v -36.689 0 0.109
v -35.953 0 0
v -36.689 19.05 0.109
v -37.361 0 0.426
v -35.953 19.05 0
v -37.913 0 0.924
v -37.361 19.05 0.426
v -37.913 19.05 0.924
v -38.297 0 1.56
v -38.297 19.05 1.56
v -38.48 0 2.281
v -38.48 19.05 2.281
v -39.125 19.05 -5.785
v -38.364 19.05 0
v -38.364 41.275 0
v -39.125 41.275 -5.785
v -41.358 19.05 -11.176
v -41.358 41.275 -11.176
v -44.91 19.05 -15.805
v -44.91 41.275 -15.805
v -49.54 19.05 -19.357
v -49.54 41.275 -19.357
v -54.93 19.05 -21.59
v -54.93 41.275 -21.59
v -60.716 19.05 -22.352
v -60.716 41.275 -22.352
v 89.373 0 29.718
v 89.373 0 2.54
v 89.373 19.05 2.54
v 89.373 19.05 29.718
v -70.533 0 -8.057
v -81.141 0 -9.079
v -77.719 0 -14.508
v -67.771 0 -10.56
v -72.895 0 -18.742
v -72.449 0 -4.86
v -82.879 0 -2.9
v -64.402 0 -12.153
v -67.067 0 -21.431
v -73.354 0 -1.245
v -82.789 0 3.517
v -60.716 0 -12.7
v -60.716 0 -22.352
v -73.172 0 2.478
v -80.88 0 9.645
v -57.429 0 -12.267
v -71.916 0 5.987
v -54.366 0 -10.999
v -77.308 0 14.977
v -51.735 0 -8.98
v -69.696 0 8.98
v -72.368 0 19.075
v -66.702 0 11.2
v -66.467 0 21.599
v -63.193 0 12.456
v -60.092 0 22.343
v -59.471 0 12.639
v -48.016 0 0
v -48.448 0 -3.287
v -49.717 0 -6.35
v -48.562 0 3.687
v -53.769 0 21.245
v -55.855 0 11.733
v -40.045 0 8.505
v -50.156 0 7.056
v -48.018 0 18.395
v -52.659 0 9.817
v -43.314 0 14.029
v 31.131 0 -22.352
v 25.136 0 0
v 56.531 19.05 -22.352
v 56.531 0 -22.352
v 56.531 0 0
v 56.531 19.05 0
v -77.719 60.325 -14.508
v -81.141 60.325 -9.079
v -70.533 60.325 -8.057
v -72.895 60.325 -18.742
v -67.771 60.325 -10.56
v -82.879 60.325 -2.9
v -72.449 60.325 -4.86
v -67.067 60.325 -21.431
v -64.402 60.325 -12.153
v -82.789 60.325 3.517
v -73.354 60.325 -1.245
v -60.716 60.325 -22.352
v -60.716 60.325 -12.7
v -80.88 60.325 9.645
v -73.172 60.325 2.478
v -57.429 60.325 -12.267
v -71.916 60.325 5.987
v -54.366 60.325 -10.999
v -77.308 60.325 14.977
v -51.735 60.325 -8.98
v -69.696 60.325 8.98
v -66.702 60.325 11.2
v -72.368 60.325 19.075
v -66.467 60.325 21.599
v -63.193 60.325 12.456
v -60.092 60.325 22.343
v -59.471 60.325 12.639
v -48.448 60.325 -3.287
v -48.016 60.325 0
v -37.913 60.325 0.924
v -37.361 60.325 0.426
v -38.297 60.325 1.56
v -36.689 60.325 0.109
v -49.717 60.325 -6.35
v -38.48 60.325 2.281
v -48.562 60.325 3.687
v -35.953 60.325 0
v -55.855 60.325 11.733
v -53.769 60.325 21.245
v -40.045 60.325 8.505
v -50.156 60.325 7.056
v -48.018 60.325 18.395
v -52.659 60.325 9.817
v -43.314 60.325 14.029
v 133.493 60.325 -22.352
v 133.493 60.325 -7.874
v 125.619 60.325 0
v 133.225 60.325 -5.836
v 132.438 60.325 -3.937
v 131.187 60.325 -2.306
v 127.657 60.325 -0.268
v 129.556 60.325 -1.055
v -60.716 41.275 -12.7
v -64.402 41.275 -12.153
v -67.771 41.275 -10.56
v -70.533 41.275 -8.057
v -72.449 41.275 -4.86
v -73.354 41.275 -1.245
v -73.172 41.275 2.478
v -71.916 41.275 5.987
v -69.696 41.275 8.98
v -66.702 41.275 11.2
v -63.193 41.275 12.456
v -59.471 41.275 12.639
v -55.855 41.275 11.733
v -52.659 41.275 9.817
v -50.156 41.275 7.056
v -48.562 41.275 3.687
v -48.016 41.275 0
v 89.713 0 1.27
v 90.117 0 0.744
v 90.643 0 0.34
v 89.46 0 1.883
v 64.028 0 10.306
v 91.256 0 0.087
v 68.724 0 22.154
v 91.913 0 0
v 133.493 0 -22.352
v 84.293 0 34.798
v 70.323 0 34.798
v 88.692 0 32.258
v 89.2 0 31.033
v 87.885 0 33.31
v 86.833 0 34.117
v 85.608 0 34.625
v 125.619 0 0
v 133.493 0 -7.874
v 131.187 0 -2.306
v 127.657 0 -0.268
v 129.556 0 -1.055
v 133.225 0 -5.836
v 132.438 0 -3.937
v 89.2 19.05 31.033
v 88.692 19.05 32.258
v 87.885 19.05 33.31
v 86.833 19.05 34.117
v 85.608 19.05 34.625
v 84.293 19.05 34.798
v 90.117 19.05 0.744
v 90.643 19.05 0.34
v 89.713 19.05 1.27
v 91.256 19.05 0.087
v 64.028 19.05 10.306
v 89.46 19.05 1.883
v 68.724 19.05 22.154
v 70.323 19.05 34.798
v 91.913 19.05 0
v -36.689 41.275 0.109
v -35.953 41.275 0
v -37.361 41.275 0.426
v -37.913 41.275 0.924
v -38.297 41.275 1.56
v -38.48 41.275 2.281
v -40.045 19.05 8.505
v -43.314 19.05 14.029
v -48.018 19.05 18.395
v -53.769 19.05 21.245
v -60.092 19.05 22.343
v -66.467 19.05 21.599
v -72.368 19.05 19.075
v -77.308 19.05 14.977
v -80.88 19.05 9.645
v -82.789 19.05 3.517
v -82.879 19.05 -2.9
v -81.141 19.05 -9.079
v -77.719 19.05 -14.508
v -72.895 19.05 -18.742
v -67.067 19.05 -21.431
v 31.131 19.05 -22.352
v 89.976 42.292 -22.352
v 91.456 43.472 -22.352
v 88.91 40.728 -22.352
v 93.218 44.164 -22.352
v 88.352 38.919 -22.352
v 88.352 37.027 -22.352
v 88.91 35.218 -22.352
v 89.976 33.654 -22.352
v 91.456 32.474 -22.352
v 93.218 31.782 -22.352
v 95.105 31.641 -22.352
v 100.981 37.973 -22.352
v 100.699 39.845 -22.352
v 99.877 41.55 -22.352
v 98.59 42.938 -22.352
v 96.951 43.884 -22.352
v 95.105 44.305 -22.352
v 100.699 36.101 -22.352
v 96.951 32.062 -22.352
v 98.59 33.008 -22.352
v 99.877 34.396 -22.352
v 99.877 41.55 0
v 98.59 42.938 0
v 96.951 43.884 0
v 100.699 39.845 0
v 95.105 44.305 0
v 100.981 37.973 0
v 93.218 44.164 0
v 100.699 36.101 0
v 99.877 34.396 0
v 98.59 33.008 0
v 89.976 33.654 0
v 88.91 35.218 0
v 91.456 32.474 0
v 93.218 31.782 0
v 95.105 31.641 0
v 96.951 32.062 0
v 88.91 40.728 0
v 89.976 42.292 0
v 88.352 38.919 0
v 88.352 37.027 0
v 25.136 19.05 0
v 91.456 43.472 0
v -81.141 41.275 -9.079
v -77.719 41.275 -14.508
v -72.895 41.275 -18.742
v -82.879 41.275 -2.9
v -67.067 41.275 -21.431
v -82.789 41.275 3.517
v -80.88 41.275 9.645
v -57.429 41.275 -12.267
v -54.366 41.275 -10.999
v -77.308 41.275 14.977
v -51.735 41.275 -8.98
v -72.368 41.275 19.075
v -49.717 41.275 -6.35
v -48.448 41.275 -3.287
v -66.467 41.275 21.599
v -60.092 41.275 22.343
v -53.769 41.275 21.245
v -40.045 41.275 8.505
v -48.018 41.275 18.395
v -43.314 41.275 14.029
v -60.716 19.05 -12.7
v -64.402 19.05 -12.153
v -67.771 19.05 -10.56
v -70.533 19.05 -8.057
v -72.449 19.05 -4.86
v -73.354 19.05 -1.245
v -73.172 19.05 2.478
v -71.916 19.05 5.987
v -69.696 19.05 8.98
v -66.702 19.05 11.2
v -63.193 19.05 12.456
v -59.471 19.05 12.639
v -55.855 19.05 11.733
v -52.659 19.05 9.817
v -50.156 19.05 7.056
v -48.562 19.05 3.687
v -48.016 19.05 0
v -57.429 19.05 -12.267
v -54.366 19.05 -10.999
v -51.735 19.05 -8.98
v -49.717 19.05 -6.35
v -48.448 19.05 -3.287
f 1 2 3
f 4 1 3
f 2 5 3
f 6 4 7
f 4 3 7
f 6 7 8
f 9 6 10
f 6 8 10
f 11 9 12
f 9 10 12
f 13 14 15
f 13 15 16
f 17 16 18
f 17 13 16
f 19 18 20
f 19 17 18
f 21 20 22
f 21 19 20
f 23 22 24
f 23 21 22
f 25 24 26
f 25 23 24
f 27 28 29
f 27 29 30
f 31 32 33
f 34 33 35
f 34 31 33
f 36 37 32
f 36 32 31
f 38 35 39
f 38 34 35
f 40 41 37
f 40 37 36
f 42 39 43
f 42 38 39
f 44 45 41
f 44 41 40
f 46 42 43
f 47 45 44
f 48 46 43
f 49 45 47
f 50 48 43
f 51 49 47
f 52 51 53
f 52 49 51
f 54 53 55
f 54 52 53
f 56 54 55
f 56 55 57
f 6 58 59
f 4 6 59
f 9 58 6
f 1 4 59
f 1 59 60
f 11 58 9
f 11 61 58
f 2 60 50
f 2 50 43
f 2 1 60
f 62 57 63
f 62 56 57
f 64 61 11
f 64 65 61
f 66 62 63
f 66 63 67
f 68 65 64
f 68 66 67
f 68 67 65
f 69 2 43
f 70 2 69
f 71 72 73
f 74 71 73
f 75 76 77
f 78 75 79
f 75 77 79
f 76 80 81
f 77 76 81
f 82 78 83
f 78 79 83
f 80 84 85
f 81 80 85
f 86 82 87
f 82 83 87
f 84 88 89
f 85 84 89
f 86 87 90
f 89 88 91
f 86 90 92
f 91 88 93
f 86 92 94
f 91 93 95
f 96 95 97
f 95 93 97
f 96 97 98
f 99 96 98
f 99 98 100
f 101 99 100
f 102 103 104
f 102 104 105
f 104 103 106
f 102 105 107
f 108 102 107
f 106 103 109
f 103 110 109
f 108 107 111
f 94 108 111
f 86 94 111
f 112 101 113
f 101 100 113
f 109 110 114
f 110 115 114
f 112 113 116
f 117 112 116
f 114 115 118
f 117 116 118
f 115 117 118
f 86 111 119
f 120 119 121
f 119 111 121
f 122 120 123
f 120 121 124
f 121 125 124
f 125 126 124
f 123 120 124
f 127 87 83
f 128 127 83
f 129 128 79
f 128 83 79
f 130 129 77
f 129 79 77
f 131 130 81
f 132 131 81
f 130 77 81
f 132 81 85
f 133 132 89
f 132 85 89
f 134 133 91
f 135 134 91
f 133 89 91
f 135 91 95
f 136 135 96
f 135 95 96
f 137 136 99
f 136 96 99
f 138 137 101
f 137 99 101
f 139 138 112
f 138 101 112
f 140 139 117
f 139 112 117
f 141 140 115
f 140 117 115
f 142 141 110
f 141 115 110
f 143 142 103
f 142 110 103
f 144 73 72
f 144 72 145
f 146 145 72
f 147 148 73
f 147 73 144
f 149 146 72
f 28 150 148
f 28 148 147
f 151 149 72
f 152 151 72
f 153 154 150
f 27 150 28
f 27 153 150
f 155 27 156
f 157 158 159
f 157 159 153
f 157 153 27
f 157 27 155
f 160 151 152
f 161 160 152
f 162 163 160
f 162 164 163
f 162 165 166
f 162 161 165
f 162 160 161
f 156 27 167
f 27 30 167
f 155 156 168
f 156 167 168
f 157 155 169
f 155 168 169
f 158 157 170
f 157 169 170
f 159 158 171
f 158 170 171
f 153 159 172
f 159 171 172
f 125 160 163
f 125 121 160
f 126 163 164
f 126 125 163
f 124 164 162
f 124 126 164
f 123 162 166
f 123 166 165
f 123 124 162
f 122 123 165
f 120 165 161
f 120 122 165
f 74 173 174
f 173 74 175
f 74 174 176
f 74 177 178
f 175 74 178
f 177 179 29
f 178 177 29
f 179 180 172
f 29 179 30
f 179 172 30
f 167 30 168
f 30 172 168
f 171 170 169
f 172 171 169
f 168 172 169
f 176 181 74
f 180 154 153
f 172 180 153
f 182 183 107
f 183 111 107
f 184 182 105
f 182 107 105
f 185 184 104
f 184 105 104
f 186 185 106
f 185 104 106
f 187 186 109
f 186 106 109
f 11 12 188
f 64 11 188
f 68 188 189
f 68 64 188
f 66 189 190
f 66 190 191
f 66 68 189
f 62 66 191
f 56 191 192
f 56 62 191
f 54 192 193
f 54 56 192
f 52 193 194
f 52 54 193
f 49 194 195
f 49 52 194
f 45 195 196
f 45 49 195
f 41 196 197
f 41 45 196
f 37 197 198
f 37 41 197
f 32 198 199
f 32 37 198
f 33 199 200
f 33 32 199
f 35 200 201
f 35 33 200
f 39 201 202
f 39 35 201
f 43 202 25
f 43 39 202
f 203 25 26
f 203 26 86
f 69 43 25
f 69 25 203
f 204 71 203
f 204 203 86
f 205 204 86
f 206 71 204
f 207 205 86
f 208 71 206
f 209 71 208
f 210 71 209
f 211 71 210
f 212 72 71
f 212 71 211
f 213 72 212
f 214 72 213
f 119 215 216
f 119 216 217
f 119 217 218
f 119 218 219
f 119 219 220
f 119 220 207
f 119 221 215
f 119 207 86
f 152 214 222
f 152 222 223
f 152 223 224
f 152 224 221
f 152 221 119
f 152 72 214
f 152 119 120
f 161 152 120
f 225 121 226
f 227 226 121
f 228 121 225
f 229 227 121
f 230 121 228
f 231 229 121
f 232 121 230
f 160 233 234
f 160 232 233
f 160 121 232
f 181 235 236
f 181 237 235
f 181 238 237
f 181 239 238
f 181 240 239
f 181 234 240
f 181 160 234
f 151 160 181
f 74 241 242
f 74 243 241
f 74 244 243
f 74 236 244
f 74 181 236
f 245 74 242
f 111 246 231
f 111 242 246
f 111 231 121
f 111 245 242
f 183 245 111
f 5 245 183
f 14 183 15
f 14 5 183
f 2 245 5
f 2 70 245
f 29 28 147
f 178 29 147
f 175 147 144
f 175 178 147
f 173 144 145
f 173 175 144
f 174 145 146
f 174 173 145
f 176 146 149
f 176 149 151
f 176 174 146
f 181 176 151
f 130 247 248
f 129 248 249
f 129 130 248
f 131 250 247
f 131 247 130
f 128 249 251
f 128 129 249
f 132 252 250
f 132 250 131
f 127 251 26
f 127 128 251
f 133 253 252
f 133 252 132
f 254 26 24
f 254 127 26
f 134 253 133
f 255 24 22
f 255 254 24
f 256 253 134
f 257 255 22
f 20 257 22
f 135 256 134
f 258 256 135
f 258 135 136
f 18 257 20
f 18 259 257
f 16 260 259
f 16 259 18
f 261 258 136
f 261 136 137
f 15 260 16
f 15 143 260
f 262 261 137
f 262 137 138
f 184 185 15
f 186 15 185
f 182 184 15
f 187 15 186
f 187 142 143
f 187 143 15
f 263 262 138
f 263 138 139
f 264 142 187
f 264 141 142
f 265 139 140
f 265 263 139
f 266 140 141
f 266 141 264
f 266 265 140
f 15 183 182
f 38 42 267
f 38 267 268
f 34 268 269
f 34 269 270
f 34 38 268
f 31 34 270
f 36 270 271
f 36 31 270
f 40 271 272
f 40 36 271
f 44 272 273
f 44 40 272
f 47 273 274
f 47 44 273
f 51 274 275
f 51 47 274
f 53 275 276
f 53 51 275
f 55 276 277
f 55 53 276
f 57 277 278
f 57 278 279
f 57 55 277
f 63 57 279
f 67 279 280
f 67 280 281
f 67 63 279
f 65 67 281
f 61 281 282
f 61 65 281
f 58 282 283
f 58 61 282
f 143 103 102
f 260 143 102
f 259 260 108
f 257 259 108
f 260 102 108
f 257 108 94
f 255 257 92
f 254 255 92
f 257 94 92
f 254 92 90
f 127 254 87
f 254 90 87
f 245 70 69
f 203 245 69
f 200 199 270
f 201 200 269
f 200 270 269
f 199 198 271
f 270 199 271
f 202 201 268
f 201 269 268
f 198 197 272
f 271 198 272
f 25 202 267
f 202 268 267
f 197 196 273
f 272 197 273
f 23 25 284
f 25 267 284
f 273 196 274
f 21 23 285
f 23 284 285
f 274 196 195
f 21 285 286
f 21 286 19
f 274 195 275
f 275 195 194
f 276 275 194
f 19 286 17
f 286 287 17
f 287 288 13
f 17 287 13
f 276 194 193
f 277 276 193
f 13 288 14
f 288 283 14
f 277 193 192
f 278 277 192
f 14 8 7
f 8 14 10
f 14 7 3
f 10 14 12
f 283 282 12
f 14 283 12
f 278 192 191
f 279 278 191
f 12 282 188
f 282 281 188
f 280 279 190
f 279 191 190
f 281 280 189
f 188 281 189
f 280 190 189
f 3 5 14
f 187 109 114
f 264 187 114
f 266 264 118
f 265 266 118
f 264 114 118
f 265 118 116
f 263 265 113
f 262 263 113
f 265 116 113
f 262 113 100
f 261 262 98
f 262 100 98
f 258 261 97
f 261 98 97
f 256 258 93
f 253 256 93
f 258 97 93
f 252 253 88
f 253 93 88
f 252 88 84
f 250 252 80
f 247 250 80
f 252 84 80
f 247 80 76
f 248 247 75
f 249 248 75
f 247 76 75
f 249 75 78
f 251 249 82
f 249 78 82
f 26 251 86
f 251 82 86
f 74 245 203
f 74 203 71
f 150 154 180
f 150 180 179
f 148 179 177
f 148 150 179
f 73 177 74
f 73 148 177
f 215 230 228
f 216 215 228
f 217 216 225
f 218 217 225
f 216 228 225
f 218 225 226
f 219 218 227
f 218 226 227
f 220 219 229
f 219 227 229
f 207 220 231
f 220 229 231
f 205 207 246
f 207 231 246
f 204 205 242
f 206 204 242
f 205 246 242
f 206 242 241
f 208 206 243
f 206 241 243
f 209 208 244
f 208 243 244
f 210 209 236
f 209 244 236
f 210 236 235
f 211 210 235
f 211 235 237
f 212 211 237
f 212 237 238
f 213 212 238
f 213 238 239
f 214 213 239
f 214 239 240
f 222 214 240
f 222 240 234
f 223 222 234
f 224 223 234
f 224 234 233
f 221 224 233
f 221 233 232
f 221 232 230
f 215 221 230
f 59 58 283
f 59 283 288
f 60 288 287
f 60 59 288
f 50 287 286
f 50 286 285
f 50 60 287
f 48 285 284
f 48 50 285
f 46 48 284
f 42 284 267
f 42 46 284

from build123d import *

# Parameters (mm, degrees)
F1_DEPTH = 60.325
F2_DEPTH = 19.05
F0_W     = 19.05
F0_H     = 34.798
F3_DEPTH = 19.05
F4_DEPTH = 19.05
F8_R     = 6.35
F9_DEPTH = 25.4
F10_R    = 7.874
F11_R    = 5.08
F12_R    = 2.54


with BuildPart() as f1:
    # F0 (on Front) → F1 (new body)
    with BuildSketch(Plane.XZ):
        with BuildLine():
            ThreePointArc((-38.3635606445, 0), (-44.9103098714, -15.8052507731), (-60.7155606445, -22.352))
            Line((-60.7155606445, -22.352), (31.1308393555, -22.352))
            Line((31.1308393555, -22.352), (25.1364393555, 0))
            Line((25.1364393555, 0), (-38.3635606445, 0))
        make_face()
        Polygon((25.1364393555, 0), (31.1308393555, -22.352), (56.5308393555, -22.352), (56.5308393555, 0), align=None)
        Polygon((56.5308393555, 0), (56.5308393555, -22.352), (133.4928393555, -22.352), (133.4928393555, 0), (89.3730393555, 0), (70.3230393555, 0), align=None)
    extrude(amount=-F1_DEPTH)

    # F0 (on Front) → F2 (cut)
    with BuildSketch(Plane.XZ):
        Polygon((25.1364393555, 0), (31.1308393555, -22.352), (56.5308393555, -22.352), (56.5308393555, 0), align=None)
    extrude(amount=-F2_DEPTH, mode=Mode.SUBTRACT)

    # F0 (on Front) → F3 (join)
    with BuildSketch(Plane.XZ):
        with BuildLine():
            ThreePointArc((70.3230393555, 34.798), (66.7492677026, 16.0821939471), (56.5308393555, 0))
            Line((56.5308393555, 0), (70.3230393555, 0))
            Line((70.3230393555, 0), (70.3230393555, 34.798))
        make_face()
        with Locations((79.8480393555, 17.399)):
            Rectangle(F0_W, F0_H)
    extrude(amount=-F3_DEPTH)


with BuildPart() as f4:
    # F0 (on Front) → F4 (new body)
    with BuildSketch(Plane.XZ):
        with BuildLine():
            ThreePointArc((-38.3635606445, 0), (-76.5208114176, 15.8052507731), (-60.7155606445, -22.352))
            ThreePointArc((-60.7155606445, -22.352), (-44.9103098714, -15.8052507731), (-38.3635606445, 0))
        make_face()
        with BuildLine():
            ThreePointArc((-60.7155606445, -12.7), (-69.6958167656, 8.9802561211), (-48.0155606445, 0))
            ThreePointArc((-48.0155606445, 0), (-51.7353045234, -8.9802561211), (-60.7155606445, -12.7))
        make_face(mode=Mode.SUBTRACT)
    extrude(amount=-F4_DEPTH)


with BuildPart() as f6_1:
    # F6: instance of F4
    add(f4.part.mirror(Plane.XZ.offset(-30.1625)))


with BuildPart() as f1_1:
    add(f1.part)

    # F7: union F4, F6_1
    add(f4.part)
    add(f6_1.part)

    # F8 (on face) → F9 (cut)
    with BuildSketch(Plane.XY):
        with Locations((94.6308393555, 37.973)):
            Circle(F8_R)
    extrude(amount=-F9_DEPTH, mode=Mode.SUBTRACT)

    # F10
    f10_edges = [f1_1.edges().sort_by_distance(p)[0] for p in [
        (133.492839, 30.1625, 0),
    ]]
    fillet(f10_edges, radius=F10_R)

    # F11
    f11_edges = [f1_1.edges().sort_by_distance(p)[0] for p in [
        (89.373039, 9.525, 34.798),
    ]]
    fillet(f11_edges, radius=F11_R)

    # F12
    f12_edges = [f1_1.edges().sort_by_distance(p)[0] for p in [
        (-38.363561, 50.8, 0),
        (-38.363561, 9.525, 0),
        (89.373039, 9.525, 0),
    ]]
    fillet(f12_edges, radius=F12_R)


solid = f1_1.part
